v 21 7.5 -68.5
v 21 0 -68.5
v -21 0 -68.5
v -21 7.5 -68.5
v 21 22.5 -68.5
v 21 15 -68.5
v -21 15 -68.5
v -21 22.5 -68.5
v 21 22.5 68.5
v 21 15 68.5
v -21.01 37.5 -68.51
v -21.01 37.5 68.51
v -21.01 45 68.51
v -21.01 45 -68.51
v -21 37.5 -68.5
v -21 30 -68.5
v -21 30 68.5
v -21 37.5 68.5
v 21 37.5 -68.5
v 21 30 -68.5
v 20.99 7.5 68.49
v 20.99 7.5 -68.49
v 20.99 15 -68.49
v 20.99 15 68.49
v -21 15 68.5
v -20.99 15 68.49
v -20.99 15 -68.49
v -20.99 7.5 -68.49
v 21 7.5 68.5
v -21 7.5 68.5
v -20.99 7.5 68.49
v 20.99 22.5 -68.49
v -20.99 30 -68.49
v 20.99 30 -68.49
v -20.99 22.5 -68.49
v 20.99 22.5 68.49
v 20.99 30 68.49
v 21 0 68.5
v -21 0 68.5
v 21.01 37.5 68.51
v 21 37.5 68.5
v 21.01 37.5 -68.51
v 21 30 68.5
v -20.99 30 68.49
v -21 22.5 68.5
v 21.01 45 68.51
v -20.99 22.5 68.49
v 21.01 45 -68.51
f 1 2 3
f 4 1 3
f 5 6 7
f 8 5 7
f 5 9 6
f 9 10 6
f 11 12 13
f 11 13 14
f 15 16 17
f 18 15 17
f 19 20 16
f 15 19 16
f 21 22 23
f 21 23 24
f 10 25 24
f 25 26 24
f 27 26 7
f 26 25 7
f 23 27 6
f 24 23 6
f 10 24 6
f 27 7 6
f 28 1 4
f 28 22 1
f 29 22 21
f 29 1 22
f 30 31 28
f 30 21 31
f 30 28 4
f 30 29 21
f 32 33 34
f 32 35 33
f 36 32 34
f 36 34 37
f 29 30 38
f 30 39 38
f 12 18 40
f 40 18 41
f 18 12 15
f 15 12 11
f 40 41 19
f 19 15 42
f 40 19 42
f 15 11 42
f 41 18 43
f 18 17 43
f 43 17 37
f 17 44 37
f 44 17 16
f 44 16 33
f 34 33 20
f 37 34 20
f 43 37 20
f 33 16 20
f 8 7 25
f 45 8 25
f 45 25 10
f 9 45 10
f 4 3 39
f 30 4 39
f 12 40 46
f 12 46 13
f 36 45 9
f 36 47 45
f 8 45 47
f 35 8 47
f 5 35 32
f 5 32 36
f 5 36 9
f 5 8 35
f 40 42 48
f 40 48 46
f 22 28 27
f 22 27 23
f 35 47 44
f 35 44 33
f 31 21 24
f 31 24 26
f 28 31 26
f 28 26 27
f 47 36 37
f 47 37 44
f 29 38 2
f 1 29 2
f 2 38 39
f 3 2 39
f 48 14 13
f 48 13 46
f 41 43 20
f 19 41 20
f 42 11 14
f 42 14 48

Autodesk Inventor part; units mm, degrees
ref_plane "YZ Plane" through (0, 0, 0) normal (1, 0, 0) x (0, 1, 0)
ref_plane "XZ Plane" through (0, 0, 0) normal (0, 1, 0) x (-1, 0, 0)
ref_plane "XY Plane" through (0, 0, 0) normal (0, 0, 1) x (1, 0, 0)
sketch "Sketch1" plane through (0, 0, 0) normal (0, 1, 0) x (-1, 0, 0)
  line L0 (21, 68.5) -> (-21, 68.5)
  line L1 (-21, 68.5) -> (-21, -68.5)
  line L2 (-21, -68.5) -> (21, -68.5)
  line L3 (21, -68.5) -> (21, 68.5)
  point P0 (0, 0)
  dimension "d0" = 42
  dimension "d1" = 137
  dimension "d2" = 21
  dimension "d3" = 68.5
extrude "Extrusion1" add sketch "Sketch1" along normal blind 7.5
sketch "Sketch3" plane through (0, 7.5, 0) normal (0, 1, 0) x (1, 0, 0)
  line L0 (21, -68.5) -> (21, 68.5) projected
  line L1 (21, 68.5) -> (-21, 68.5) projected
  line L2 (-21, 68.5) -> (-21, -68.5) projected
  line L3 (-21, -68.5) -> (21, -68.5) projected
  line L4 (-20.99, -68.49) -> (-20.99, 68.49)
  line L5 (-20.99, 68.49) -> (20.99, 68.49)
  line L6 (20.99, 68.49) -> (20.99, -68.49)
  line L7 (20.99, -68.49) -> (-20.99, -68.49)
  point P0 (0, 0)
  dimension "d6" = 0.01
extrude "Extrusion2" add sketch "Sketch3" along normal blind 7.5 contours L4 L5 L6 L7
sketch "Sketch4" plane through (0, 15, 0) normal (0, 1, 0) x (1, 0, 0)
  line L0 (20.99, -68.49) -> (-20.99, -68.49) projected
  line L1 (-20.99, -68.49) -> (-20.99, 68.49) projected
  line L2 (-20.99, 68.49) -> (20.99, 68.49) projected
  line L3 (20.99, 68.49) -> (20.99, -68.49) projected
  line L4 (21, -68.5) -> (21, 68.5) projected
  line L5 (21, 68.5) -> (-21, 68.5) projected
  line L6 (-21, 68.5) -> (-21, -68.5) projected
  line L7 (-21, -68.5) -> (21, -68.5) projected
  point P0 (0, 0)
extrude "Extrusion3" add sketch "Sketch4" along normal blind 7.5 contours L0 L1 L2 L3 | L7 L6 L5 L4
sketch "Sketch5" plane through (0, 22.5, 0) normal (0, 1, 0) x (1, 0, 0)
  line L0 (21, 68.5) -> (-21, 68.5) projected
  line L1 (-21, 68.5) -> (-21, -68.5) projected
  line L2 (-21, -68.5) -> (21, -68.5) projected
  line L3 (21, -68.5) -> (21, 68.5) projected
  line L4 (-20.99, -68.49) -> (-20.99, 68.49)
  line L5 (-20.99, 68.49) -> (20.99, 68.49)
  line L6 (20.99, 68.49) -> (20.99, -68.49)
  line L7 (20.99, -68.49) -> (-20.99, -68.49)
  point P0 (0, 0)
  dimension "d11" = 0.01
extrude "Extrusion4" add sketch "Sketch5" along normal blind 7.5 contours L4 L5 L6 L7
sketch "Sketch6" plane through (0, 30, 0) normal (0, 1, 0) x (1, 0, 0)
  line L0 (20.99, -68.49) -> (-20.99, -68.49) projected
  line L1 (-20.99, -68.49) -> (-20.99, 68.49) projected
  line L2 (-20.99, 68.49) -> (20.99, 68.49) projected
  line L3 (20.99, 68.49) -> (20.99, -68.49) projected
  line L4 (21, 68.5) -> (-21, 68.5) projected
  line L5 (-21, 68.5) -> (-21, -68.5) projected
  line L6 (-21, -68.5) -> (21, -68.5) projected
  line L7 (21, -68.5) -> (21, 68.5) projected
  point P0 (0, 0)
extrude "Extrusion5" add sketch "Sketch6" along normal blind 7.5 contours L0 L1 L2 L3 | L7 L6 L5 L4
sketch "Sketch7" plane through (0, 37.5, 0) normal (0, 1, 0) x (1, 0, 0)
  line L0 (-21, 68.5) -> (-21, -68.5) projected
  line L1 (-21, -68.5) -> (21, -68.5) projected
  line L2 (21, -68.5) -> (21, 68.5) projected
  line L3 (21, 68.5) -> (-21, 68.5) projected
  line L4 (-21.01, -68.51) -> (-21.01, 68.51)
  line L5 (-21.01, 68.51) -> (21.01, 68.51)
  line L6 (21.01, 68.51) -> (21.01, -68.51)
  line L7 (21.01, -68.51) -> (-21.01, -68.51)
  point P0 (0, 0)
  dimension "d16" = 0.01
extrude "Extrusion6" add sketch "Sketch7" along normal blind 7.5 contours L3 L2 L1 L0 | L4 L5 L6 L7
equation "\"d2\" = 0.5 * d0"
equation "\"d3\" = 0.5 * d1"
properties part number "Battery_model"
